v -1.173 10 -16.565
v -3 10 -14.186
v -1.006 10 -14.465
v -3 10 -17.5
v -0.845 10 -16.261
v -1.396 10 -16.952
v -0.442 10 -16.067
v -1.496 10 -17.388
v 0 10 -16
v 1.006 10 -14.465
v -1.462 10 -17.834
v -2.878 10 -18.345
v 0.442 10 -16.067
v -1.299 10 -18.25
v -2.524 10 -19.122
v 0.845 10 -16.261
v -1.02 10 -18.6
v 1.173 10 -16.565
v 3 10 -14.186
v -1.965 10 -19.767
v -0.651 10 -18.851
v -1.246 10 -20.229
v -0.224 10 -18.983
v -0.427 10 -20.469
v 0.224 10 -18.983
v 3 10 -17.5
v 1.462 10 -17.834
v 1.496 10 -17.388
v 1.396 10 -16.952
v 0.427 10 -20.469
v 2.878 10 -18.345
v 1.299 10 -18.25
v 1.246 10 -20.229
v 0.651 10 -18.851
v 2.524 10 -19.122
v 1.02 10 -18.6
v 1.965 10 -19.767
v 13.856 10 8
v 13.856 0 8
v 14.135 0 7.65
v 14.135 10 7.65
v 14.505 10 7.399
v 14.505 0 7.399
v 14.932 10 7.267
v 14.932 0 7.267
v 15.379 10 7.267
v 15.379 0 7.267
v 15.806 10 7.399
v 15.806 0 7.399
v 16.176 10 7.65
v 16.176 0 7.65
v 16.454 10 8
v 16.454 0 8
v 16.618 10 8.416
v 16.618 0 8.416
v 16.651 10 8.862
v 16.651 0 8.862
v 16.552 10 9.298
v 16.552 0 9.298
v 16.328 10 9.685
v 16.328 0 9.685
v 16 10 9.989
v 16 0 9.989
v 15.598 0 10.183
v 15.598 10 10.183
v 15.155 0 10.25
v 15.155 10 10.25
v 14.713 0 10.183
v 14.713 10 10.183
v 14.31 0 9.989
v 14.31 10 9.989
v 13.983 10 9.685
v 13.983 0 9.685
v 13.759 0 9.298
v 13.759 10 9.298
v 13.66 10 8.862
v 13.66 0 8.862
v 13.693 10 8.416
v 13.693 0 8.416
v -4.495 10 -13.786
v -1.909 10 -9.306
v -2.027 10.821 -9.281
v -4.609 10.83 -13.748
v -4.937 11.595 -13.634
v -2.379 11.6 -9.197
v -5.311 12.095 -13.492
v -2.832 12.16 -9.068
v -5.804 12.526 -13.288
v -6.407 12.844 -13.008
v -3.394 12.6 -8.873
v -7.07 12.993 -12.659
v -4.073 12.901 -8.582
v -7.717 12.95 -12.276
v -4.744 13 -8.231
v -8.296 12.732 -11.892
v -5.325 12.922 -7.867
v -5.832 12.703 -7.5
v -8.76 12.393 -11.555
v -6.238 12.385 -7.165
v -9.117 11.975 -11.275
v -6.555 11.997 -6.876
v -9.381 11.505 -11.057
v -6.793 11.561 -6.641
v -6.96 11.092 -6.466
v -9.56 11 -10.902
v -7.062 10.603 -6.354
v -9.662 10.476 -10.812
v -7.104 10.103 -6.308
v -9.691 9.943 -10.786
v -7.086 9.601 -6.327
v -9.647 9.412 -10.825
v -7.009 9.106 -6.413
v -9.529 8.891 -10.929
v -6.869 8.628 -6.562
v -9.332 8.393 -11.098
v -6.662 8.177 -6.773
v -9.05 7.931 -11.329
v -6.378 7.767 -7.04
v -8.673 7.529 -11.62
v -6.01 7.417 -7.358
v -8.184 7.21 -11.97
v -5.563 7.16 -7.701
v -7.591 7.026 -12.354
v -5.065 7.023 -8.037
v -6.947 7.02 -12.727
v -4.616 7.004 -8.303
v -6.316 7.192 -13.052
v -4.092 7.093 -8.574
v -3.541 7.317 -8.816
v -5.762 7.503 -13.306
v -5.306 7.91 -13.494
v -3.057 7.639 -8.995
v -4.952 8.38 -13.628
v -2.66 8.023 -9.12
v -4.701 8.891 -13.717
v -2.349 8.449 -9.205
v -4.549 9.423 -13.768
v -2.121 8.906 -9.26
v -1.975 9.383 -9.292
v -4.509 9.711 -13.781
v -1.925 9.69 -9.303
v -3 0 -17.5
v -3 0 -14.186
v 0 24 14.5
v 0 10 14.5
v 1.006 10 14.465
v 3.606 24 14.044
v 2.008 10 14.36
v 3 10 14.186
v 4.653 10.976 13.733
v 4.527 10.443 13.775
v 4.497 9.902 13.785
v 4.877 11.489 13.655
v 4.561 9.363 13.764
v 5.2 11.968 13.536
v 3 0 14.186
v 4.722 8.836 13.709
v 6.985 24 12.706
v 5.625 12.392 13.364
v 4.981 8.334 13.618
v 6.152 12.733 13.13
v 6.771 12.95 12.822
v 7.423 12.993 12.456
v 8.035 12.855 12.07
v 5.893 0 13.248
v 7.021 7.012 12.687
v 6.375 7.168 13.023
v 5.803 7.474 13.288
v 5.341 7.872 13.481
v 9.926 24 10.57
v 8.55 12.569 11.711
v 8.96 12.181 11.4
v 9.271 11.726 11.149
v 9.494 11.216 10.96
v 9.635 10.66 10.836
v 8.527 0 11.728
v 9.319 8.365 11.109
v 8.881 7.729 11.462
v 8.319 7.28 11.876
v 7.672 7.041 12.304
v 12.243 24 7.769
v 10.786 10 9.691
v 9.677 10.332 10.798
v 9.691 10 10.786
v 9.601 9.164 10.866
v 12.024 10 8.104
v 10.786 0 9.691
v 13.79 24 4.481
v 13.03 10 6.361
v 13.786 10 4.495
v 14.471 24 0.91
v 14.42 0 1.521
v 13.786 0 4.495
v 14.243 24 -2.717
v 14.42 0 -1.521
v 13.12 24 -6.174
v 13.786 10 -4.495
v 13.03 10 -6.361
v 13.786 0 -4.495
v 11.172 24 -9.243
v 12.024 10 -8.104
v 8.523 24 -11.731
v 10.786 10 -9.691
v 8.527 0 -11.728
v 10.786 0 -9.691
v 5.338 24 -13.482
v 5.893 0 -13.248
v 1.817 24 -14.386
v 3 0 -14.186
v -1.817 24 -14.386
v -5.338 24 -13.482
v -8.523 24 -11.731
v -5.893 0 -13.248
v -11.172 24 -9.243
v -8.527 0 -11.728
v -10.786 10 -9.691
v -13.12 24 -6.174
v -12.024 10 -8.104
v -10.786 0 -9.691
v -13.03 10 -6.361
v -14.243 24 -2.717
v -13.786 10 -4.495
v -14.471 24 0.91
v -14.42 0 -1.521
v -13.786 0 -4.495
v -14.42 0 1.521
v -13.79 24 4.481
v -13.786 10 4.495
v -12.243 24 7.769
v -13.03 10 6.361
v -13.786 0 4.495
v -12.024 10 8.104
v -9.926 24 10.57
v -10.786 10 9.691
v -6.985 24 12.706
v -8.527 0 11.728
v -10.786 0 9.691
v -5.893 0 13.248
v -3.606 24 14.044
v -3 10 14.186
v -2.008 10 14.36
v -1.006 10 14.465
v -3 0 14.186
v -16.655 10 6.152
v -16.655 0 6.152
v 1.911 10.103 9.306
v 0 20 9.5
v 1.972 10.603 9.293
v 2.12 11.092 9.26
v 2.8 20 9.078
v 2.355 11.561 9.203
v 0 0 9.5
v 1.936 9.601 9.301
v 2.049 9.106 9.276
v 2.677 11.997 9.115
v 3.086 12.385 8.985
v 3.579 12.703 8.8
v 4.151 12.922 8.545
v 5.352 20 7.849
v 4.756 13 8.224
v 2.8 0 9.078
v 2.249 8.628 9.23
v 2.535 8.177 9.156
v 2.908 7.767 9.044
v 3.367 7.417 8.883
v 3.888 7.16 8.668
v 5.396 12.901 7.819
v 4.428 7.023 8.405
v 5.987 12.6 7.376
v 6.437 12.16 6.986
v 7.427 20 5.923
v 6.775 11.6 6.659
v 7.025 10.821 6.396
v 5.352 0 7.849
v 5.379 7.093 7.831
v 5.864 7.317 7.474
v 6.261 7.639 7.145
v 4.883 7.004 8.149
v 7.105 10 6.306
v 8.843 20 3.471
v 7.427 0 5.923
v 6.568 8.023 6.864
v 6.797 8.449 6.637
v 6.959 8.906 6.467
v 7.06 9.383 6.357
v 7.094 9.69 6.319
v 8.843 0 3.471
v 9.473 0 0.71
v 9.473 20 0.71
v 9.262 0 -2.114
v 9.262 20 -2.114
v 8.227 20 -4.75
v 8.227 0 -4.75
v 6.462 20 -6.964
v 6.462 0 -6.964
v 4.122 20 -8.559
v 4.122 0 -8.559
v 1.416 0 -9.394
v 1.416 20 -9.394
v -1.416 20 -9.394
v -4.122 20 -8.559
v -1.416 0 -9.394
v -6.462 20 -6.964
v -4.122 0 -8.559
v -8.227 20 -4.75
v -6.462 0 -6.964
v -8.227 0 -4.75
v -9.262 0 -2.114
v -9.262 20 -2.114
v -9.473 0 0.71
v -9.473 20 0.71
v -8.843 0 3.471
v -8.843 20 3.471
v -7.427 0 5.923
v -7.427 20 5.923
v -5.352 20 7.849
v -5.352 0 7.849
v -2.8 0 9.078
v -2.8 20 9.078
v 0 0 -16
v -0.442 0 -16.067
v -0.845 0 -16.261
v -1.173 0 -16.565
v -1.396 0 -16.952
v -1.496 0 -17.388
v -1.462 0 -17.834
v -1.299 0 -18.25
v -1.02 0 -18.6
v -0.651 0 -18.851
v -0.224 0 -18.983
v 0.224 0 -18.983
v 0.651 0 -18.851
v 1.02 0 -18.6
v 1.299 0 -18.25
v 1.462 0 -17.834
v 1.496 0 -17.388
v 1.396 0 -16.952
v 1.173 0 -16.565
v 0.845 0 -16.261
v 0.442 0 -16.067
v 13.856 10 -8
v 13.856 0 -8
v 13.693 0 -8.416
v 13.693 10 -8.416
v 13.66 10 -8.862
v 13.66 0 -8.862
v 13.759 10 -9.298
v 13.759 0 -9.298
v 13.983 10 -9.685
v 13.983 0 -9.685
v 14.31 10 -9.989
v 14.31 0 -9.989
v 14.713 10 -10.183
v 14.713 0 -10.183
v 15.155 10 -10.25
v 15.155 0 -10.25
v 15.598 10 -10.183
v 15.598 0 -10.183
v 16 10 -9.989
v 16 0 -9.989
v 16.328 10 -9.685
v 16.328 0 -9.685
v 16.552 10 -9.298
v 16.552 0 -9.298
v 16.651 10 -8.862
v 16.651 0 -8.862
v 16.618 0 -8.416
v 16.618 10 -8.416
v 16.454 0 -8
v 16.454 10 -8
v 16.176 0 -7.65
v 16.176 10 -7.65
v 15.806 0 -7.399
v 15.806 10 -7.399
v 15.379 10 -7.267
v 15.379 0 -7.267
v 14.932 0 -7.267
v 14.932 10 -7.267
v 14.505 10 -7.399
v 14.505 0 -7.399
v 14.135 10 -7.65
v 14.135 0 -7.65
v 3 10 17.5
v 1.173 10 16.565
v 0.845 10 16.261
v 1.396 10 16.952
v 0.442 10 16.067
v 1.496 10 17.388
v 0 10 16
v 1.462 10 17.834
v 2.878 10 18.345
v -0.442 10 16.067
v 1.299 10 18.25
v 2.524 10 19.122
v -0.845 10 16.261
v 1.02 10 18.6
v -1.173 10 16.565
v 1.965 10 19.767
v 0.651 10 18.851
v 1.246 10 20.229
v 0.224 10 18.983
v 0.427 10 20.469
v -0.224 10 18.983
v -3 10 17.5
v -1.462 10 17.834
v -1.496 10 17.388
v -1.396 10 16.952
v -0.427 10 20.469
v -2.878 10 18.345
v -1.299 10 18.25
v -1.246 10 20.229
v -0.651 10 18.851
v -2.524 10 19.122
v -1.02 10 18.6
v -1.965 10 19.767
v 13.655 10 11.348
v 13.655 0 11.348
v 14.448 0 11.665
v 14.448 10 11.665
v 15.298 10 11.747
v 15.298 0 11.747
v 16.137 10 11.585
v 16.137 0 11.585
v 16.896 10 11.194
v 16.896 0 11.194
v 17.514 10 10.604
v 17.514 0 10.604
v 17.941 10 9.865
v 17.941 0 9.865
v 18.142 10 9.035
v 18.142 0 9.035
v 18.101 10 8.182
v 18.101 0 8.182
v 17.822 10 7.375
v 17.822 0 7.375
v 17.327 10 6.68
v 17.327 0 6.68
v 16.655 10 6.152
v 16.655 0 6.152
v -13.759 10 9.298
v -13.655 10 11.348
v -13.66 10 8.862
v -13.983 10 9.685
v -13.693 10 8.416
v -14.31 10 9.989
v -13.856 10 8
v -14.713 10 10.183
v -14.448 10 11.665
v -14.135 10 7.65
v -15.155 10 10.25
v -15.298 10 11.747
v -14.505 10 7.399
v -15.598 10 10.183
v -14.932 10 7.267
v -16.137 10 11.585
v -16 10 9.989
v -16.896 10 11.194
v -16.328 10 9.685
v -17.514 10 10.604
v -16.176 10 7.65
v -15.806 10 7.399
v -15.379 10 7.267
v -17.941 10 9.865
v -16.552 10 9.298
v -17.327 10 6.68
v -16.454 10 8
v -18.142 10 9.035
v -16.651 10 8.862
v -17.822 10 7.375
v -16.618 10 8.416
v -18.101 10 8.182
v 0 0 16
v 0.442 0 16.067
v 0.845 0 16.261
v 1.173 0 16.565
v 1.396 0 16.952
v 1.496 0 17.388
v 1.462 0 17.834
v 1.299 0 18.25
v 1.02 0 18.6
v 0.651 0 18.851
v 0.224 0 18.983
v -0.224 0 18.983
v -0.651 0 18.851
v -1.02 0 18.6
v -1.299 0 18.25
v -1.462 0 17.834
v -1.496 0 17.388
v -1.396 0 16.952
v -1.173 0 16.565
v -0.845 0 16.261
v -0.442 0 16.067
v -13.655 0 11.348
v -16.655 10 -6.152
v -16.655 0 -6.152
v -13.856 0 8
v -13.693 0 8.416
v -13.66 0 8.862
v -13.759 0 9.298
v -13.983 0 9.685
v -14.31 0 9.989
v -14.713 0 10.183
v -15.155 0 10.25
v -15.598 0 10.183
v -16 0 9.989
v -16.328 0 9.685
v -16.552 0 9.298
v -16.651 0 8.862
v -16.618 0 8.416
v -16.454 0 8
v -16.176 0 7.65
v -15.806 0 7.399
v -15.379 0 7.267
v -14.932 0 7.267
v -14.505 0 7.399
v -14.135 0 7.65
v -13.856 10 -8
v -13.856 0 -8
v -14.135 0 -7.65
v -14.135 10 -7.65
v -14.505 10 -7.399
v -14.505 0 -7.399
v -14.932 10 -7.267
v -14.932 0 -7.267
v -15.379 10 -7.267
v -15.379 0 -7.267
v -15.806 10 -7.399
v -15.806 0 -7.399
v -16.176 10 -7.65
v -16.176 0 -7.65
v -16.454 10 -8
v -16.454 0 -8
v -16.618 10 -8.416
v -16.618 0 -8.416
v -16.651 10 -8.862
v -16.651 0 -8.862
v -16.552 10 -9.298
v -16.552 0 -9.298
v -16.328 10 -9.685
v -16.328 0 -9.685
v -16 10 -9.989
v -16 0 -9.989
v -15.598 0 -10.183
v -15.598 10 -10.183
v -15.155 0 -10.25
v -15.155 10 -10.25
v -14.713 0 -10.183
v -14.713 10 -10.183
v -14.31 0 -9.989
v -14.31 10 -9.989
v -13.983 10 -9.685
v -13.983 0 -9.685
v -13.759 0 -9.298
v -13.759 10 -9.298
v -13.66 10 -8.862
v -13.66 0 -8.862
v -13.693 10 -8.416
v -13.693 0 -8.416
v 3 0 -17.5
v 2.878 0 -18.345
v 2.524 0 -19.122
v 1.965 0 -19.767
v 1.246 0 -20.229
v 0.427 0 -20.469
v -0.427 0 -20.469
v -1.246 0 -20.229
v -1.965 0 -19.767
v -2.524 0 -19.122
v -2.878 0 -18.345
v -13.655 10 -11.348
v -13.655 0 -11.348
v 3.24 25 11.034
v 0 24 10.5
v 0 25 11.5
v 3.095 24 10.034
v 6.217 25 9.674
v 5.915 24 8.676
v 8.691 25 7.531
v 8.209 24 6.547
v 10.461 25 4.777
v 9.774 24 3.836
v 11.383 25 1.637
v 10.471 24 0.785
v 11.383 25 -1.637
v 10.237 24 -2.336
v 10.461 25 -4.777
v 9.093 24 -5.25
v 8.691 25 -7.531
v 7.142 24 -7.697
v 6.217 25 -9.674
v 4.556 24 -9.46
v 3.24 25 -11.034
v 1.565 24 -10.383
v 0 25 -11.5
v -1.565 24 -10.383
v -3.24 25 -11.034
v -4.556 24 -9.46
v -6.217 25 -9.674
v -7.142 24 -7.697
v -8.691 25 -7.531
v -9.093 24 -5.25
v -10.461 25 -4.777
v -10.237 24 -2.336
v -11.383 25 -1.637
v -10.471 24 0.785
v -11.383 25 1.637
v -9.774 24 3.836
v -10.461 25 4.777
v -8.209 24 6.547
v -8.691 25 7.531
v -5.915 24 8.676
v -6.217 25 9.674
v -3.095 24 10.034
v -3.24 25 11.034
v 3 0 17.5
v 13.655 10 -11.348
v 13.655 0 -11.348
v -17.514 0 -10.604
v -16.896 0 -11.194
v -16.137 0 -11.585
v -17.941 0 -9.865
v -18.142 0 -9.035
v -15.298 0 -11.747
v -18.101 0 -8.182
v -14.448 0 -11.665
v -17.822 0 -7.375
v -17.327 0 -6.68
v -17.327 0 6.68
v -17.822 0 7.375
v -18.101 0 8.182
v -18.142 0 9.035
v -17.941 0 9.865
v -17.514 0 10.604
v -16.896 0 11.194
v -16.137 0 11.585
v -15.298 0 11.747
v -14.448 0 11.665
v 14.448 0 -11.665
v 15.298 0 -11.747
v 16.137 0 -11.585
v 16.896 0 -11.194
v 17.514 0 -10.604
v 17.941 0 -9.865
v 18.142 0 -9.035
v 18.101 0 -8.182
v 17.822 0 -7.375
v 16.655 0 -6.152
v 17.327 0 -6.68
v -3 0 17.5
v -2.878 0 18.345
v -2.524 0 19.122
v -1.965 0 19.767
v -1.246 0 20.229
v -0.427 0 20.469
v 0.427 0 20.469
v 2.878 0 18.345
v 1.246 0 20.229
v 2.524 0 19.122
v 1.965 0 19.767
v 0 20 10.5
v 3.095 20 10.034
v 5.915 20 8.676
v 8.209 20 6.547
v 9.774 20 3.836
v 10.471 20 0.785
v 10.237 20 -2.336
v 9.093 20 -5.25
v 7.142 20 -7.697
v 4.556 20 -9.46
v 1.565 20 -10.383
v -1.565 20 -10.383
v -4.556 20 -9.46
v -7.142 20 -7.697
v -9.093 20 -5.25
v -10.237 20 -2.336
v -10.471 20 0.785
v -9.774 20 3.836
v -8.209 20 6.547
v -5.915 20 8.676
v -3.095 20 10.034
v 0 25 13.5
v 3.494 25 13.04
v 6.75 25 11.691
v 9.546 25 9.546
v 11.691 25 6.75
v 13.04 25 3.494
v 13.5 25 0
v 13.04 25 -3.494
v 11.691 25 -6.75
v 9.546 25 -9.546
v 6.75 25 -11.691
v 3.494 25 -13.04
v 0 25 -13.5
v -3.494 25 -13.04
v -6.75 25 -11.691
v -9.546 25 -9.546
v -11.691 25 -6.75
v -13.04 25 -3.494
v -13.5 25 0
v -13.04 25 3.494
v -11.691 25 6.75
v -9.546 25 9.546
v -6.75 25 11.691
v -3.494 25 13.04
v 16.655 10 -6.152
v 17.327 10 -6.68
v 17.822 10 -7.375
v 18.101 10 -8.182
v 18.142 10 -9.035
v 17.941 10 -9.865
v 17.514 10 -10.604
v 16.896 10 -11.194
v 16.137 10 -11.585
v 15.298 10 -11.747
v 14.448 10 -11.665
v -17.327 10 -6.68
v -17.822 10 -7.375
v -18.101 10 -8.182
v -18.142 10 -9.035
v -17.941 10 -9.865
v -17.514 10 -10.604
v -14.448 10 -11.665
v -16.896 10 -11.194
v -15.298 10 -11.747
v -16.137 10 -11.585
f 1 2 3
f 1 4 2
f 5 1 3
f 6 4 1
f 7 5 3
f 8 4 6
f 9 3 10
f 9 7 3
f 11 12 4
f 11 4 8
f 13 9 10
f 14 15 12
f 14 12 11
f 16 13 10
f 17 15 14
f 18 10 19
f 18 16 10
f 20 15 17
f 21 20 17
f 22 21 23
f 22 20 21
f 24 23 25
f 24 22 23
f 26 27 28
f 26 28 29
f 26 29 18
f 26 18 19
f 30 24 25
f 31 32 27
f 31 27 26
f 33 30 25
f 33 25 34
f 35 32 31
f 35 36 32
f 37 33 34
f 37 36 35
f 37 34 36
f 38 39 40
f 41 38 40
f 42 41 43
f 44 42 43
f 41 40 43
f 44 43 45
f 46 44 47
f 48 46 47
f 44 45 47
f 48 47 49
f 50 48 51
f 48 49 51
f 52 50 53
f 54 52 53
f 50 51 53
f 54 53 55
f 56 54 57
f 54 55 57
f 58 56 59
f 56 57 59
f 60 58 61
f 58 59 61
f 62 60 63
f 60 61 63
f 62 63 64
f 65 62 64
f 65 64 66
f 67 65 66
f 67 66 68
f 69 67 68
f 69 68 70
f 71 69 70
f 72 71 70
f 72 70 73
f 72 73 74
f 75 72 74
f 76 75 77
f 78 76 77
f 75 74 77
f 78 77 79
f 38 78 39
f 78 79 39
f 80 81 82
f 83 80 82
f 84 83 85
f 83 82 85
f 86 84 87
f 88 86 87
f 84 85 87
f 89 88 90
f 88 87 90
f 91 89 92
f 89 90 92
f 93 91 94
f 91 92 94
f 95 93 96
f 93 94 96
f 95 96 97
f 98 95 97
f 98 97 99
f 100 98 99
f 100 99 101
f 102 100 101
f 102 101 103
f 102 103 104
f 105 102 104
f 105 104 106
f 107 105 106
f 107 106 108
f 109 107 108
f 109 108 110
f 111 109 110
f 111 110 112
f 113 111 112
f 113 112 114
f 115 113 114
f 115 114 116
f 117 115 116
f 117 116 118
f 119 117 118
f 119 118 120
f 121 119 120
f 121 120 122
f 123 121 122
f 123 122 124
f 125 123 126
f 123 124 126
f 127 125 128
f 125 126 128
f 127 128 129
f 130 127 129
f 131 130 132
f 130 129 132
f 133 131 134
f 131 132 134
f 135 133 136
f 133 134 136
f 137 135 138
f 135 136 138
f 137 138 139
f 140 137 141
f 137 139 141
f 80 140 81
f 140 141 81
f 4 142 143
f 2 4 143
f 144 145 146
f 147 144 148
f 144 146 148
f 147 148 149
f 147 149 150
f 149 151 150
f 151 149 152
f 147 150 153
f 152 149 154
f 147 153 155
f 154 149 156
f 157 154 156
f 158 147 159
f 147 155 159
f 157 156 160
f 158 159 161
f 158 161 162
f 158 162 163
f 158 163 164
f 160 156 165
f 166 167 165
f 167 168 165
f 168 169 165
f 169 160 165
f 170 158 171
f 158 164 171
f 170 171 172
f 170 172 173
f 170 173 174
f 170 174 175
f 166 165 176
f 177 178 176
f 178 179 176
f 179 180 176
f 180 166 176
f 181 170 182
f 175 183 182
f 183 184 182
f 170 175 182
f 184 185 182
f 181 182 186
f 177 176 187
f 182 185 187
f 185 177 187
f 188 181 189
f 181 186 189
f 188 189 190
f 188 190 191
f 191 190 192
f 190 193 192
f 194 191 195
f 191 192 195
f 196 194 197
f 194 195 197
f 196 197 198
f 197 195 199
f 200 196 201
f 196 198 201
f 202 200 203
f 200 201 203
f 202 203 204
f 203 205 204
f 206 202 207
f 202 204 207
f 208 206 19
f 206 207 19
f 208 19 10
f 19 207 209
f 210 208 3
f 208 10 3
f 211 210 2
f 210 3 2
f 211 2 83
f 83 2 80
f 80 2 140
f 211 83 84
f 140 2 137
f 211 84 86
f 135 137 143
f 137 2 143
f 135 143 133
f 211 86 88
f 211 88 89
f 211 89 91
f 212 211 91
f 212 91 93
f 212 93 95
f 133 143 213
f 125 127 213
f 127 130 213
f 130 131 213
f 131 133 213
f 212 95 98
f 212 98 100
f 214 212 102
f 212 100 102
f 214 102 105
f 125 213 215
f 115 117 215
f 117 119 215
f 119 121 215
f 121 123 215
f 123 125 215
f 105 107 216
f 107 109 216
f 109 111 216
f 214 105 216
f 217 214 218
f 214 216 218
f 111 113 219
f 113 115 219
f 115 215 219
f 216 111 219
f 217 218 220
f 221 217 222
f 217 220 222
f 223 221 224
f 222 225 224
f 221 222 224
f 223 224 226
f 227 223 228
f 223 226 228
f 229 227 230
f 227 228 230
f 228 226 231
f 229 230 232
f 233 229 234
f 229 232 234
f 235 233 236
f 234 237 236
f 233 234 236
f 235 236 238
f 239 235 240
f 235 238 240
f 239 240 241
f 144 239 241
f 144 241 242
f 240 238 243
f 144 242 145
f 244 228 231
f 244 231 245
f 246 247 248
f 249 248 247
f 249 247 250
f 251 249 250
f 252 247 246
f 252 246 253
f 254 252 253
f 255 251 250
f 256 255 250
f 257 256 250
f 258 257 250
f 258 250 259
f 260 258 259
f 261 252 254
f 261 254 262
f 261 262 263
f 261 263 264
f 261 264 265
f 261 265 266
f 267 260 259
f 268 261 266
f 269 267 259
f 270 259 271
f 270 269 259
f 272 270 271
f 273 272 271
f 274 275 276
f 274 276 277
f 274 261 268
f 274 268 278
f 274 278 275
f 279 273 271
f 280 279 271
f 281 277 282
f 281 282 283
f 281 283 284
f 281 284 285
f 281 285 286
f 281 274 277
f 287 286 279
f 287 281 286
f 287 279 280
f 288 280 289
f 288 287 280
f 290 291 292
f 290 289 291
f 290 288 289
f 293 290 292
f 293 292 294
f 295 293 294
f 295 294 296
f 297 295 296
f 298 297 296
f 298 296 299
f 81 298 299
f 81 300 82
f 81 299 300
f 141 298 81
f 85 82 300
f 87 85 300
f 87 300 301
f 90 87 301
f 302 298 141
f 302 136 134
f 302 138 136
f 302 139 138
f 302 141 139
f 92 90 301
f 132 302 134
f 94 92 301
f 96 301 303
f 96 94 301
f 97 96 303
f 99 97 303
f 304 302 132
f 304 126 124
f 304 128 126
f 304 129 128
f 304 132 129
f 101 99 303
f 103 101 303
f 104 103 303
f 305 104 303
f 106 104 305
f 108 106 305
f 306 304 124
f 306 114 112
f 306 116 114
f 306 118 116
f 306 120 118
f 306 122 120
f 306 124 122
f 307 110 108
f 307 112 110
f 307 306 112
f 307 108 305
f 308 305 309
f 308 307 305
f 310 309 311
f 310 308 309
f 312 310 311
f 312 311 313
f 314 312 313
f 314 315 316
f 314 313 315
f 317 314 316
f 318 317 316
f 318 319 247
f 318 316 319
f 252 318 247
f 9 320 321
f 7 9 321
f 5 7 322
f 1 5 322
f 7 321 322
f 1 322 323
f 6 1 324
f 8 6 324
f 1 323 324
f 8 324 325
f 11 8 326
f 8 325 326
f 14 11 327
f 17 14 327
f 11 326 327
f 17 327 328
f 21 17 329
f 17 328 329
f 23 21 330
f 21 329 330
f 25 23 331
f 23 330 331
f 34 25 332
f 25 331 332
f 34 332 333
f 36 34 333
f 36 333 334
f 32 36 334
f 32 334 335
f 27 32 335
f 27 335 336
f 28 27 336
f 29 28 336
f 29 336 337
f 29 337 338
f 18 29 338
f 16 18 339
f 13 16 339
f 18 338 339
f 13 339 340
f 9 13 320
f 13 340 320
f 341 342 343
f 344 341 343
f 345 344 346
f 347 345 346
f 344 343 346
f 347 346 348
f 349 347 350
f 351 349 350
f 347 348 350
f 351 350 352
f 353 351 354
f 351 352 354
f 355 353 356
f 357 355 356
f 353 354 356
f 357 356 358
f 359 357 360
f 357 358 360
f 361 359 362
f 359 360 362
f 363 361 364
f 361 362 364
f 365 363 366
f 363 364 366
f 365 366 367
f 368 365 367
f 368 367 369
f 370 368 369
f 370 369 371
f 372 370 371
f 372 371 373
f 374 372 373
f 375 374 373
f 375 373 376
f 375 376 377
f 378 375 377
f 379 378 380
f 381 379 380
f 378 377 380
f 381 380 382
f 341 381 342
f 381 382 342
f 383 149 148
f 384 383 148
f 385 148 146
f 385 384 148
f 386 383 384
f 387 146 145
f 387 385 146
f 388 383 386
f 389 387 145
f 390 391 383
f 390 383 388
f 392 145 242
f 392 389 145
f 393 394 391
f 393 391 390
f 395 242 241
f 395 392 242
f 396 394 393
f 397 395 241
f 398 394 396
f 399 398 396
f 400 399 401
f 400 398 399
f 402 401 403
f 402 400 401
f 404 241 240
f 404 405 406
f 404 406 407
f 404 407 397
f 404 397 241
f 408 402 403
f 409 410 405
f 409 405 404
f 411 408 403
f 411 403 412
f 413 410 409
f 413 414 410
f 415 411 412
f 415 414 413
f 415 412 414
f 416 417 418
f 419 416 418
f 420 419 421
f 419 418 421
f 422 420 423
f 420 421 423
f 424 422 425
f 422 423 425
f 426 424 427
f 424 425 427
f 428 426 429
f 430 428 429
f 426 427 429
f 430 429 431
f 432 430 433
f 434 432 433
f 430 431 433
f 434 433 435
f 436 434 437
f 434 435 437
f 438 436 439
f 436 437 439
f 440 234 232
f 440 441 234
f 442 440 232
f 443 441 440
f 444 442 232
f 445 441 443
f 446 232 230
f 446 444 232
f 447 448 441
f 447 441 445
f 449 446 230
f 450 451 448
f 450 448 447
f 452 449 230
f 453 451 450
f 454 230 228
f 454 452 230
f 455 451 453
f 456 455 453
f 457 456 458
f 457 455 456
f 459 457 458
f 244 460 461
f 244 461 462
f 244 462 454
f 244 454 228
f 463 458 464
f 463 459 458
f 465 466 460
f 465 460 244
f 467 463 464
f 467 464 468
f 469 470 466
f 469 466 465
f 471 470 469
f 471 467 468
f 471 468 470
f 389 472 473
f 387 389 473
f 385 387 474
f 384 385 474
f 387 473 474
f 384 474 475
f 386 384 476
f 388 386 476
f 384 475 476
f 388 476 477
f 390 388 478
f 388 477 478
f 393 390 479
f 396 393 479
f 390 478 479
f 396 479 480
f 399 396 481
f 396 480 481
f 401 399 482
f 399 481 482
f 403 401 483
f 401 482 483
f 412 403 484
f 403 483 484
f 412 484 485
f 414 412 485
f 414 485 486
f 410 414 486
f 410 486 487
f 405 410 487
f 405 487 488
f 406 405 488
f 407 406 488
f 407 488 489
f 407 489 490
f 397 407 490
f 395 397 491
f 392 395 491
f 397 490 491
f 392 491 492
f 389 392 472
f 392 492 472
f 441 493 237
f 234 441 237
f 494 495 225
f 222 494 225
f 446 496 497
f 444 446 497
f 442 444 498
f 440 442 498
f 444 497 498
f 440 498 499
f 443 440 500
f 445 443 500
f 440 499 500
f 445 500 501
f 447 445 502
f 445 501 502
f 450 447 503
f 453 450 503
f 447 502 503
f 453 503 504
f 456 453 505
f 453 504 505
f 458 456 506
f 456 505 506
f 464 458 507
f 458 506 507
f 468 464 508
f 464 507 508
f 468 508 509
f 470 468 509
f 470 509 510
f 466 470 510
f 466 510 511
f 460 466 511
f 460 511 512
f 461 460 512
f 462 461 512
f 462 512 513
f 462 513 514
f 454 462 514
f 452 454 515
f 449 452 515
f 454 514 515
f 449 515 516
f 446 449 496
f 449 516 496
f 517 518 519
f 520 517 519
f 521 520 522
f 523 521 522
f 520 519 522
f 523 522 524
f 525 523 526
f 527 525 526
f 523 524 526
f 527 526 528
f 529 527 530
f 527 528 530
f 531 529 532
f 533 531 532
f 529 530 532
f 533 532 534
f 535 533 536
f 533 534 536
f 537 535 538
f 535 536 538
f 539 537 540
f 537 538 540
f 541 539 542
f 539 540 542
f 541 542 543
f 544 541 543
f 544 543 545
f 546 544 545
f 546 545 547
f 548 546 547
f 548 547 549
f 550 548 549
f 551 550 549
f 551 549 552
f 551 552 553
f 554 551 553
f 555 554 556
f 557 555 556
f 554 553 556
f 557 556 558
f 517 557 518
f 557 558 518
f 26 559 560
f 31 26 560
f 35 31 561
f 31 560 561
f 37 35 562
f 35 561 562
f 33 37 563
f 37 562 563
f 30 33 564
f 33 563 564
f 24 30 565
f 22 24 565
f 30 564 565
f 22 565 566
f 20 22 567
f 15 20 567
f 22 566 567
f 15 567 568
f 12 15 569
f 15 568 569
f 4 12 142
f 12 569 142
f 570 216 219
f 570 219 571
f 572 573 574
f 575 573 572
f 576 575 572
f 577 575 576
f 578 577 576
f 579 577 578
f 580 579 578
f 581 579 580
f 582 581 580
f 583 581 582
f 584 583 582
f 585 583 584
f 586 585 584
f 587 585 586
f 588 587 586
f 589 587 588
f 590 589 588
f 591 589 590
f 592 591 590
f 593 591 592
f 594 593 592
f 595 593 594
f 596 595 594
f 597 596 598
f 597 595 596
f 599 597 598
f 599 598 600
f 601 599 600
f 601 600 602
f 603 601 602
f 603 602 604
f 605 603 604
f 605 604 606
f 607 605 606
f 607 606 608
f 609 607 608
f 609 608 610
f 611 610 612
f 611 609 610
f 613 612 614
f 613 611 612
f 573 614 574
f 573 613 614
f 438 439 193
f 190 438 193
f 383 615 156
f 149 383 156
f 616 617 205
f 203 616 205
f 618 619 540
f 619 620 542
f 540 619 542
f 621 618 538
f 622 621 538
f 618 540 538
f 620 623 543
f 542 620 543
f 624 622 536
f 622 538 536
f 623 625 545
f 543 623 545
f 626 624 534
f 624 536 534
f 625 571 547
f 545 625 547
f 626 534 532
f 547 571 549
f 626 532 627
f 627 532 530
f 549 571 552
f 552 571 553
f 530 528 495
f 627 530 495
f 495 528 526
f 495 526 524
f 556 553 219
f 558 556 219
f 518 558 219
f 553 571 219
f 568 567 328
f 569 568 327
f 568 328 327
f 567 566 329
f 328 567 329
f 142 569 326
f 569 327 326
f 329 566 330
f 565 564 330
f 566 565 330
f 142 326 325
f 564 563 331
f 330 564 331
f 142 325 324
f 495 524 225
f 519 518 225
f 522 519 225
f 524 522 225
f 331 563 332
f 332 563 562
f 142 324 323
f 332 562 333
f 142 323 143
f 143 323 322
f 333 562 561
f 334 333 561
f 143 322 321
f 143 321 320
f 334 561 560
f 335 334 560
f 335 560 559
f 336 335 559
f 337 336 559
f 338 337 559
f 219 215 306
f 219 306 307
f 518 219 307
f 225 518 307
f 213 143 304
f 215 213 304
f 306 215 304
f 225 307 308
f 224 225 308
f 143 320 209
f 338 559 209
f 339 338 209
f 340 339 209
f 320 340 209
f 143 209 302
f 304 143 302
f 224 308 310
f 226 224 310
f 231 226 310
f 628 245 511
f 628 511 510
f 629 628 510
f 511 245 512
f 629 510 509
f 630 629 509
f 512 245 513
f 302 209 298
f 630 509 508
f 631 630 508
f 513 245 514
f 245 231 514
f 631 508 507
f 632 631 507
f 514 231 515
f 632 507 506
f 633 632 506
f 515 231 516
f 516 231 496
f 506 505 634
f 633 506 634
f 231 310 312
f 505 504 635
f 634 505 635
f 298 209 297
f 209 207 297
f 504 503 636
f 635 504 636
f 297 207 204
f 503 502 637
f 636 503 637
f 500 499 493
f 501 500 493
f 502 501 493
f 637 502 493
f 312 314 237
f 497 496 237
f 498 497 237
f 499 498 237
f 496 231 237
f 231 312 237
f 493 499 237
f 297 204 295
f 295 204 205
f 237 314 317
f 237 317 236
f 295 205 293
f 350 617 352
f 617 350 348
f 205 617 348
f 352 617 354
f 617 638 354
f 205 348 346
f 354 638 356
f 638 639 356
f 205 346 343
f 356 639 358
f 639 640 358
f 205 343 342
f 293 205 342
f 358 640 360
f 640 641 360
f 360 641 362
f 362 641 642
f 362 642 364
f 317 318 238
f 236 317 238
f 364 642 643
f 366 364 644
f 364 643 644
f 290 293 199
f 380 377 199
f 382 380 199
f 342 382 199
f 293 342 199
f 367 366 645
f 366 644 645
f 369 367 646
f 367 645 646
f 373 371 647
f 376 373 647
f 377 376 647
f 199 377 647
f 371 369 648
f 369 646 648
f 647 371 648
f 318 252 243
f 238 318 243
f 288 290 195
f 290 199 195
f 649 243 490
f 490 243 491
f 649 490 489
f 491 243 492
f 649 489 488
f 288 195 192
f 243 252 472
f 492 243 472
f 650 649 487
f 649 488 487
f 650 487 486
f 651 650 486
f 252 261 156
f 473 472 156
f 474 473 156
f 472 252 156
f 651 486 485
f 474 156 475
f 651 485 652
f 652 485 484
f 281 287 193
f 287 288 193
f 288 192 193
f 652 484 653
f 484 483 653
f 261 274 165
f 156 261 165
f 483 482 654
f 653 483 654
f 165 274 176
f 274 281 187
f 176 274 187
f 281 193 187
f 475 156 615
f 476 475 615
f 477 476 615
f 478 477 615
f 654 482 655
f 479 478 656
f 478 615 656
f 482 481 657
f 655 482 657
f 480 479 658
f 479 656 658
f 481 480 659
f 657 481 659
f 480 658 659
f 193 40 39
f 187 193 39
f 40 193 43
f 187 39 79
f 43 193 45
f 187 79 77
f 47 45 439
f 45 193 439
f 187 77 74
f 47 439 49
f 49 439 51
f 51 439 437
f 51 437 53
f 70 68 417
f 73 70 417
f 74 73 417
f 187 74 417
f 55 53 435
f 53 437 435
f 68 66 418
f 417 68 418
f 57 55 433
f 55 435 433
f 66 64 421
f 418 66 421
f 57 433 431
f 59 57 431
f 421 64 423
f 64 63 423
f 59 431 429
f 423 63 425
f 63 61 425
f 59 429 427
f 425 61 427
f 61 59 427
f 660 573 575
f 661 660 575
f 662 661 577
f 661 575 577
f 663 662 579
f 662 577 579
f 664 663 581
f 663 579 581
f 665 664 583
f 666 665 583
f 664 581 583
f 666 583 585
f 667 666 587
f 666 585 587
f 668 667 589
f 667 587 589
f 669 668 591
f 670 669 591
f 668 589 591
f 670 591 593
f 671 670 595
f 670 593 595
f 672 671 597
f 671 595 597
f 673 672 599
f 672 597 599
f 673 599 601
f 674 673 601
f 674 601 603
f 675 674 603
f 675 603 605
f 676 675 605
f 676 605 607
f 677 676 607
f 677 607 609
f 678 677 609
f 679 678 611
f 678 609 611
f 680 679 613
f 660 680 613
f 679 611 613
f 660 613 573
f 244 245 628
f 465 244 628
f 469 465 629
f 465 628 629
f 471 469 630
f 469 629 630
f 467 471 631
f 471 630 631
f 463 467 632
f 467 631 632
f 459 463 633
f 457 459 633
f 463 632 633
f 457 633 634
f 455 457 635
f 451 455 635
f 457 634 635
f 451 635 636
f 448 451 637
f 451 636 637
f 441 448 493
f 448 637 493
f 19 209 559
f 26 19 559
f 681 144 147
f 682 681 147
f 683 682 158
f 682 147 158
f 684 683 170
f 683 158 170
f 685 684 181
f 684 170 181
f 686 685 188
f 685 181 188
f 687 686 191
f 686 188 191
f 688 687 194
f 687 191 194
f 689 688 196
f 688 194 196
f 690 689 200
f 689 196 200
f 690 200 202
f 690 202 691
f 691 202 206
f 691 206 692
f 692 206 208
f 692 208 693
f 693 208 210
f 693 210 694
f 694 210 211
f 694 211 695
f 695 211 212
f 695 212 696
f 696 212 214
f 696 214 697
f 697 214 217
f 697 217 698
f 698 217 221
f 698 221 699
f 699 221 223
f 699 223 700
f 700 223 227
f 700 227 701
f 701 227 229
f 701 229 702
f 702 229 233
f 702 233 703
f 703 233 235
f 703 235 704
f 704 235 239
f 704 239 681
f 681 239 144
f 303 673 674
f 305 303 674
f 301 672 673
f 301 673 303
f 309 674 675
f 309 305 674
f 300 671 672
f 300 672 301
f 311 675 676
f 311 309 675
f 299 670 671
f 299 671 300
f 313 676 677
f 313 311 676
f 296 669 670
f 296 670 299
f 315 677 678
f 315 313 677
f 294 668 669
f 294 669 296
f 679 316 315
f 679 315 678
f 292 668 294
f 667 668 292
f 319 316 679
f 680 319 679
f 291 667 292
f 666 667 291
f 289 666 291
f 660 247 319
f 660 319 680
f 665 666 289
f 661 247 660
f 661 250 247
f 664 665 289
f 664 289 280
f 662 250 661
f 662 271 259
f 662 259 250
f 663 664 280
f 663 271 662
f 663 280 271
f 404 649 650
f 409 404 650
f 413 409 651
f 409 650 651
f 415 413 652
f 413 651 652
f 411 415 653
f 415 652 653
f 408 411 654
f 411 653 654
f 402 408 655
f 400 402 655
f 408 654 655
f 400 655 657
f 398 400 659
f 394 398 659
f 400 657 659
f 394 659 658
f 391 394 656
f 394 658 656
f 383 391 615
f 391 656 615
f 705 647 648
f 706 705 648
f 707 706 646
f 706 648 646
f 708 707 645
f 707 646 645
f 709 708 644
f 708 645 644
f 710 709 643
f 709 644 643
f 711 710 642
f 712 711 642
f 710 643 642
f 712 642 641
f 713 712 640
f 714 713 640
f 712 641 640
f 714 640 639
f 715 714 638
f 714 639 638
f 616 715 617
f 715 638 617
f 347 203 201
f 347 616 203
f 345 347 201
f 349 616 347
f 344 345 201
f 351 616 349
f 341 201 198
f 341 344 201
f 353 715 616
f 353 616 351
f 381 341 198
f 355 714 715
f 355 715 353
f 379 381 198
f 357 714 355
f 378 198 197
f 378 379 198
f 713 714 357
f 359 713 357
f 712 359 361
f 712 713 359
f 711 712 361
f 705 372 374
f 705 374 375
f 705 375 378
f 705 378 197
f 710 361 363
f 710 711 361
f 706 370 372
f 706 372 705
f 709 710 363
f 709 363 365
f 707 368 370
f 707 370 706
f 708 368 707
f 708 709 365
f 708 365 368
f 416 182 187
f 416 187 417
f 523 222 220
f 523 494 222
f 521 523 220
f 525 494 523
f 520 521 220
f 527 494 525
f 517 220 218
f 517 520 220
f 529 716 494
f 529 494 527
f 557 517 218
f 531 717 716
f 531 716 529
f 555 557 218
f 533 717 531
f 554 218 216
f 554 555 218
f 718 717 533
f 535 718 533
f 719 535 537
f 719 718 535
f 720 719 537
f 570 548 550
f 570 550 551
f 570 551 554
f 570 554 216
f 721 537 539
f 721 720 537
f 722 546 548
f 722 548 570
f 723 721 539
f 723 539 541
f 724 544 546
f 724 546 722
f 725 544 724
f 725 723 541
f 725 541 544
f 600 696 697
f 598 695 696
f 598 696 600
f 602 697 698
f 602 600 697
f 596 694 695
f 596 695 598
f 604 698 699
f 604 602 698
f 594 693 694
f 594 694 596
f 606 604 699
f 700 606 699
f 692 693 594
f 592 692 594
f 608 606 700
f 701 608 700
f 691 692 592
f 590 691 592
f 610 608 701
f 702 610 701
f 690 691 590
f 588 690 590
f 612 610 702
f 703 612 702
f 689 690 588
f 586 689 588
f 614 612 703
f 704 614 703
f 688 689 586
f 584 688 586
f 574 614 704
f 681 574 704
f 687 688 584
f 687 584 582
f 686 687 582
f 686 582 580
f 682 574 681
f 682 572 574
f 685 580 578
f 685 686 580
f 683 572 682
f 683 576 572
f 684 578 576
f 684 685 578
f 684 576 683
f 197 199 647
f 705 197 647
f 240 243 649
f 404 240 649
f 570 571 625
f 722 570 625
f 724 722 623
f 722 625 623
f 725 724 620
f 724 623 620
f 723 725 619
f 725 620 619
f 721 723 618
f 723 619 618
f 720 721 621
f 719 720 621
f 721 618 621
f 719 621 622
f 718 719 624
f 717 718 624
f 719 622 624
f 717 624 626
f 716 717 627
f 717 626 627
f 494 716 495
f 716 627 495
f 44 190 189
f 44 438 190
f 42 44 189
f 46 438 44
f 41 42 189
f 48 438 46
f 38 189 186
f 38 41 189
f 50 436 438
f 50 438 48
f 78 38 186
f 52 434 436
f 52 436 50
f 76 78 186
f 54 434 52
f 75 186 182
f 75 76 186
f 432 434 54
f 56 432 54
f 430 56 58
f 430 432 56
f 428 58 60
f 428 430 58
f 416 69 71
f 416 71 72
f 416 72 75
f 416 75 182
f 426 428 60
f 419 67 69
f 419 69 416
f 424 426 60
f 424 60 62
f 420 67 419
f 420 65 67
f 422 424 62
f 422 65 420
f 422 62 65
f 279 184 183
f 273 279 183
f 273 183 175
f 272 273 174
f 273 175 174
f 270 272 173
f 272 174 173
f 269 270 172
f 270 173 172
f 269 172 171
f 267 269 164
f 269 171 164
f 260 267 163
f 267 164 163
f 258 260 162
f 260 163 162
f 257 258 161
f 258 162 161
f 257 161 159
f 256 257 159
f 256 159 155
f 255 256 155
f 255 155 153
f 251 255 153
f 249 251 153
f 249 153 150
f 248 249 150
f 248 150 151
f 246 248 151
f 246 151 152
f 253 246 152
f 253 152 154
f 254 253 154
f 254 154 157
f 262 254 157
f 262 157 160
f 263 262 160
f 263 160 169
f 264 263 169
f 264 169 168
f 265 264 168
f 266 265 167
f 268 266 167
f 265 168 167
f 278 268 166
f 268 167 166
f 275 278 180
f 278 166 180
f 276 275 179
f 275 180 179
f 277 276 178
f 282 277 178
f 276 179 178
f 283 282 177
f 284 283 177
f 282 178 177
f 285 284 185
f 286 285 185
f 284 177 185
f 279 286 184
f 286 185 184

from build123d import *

# Parameters (mm, degrees)
SKETCH1_R           = 14.5
SKETCH1_R_2         = 9.5
BOSS_EXTRUDE1_DEPTH = 25
SKETCH2_R           = 1.5
BOSS_EXTRUDE2_DEPTH = 10
CIRPATTERN1_COUNT   = 6
SKETCH3_R           = 10.5
CUT_EXTRUDE1_DEPTH  = 5
CHAMFER1_SIZE       = 1
CHAMFER2_SIZE       = 1
SKETCH5_R           = 3
CUT_EXTRUDE2_DEPTH  = 32


with BuildPart() as part:
    # Sketch1 → Boss-Extrude1 (new body)
    with BuildSketch(Plane(origin=(0, 0, 0), x_dir=(1, 0, 0), z_dir=(0, 1, 0))):
        with Locations(Location((0, 0, 0), (0, 0, 270))):
            Circle(SKETCH1_R)
        with Locations(Location((0, 0, 0), (0, 0, 270))):
            Circle(SKETCH1_R_2, mode=Mode.SUBTRACT)
    extrude(amount=BOSS_EXTRUDE1_DEPTH)

    # Sketch2 → Boss-Extrude2 (add)
    with BuildSketch(Plane.XZ):
        with BuildLine():
            Line((-3, 13.002684968), (-3, 17.5))
            ThreePointArc((-3, 17.5), (0, 20.5), (3, 17.5))
            Line((3, 17.5), (3, 13.002684968))
            Line((3, 13.002684968), (-3, 13.002684968))
        make_face()
        with Locations(Location((0, 17.5, 0), (0, 0, 270))):
            Circle(SKETCH2_R, mode=Mode.SUBTRACT)
    boss_extrude2 = extrude(amount=-BOSS_EXTRUDE2_DEPTH)

    # CirPattern1: Boss-Extrude2 ×6 about axis
    cirpattern1_axis = Axis((0, 0, 0), (0, 1, 0))
    for i in range(1, CIRPATTERN1_COUNT):
        add(boss_extrude2.rotate(cirpattern1_axis, i * 360 / CIRPATTERN1_COUNT))

    # Sketch3 → Cut-Extrude1 (cut)
    with BuildSketch(Plane(origin=(0, 25, 0), x_dir=(1, 0, 0), z_dir=(0, 1, 0))):
        with Locations(Location((0, 0, 0), (0, 0, 270))):
            Circle(SKETCH3_R)
    extrude(amount=-CUT_EXTRUDE1_DEPTH, mode=Mode.SUBTRACT)

    # Chamfer1
    chamfer1_edges = [part.edges().sort_by_distance(p)[0] for p in [
        (0, 25, -10.5),
    ]]
    chamfer(chamfer1_edges, length=CHAMFER1_SIZE)

    # Chamfer2
    chamfer2_edges = [part.edges().sort_by_distance(p)[0] for p in [
        (0, 25, -14.5),
    ]]
    chamfer(chamfer2_edges, length=CHAMFER2_SIZE)

    # Sketch5 → Cut-Extrude2 (cut)
    with BuildSketch(Plane(origin=(7.25, 25, 12.557368355), x_dir=(0.8660254037844379, 0, -0.5000000000000013), z_dir=(0.5000000000000013, 0, 0.8660254037844379))):
        with Locations((0, -15)):
            Circle(SKETCH5_R)
    extrude(amount=-CUT_EXTRUDE2_DEPTH, mode=Mode.SUBTRACT)


solid = part.part
